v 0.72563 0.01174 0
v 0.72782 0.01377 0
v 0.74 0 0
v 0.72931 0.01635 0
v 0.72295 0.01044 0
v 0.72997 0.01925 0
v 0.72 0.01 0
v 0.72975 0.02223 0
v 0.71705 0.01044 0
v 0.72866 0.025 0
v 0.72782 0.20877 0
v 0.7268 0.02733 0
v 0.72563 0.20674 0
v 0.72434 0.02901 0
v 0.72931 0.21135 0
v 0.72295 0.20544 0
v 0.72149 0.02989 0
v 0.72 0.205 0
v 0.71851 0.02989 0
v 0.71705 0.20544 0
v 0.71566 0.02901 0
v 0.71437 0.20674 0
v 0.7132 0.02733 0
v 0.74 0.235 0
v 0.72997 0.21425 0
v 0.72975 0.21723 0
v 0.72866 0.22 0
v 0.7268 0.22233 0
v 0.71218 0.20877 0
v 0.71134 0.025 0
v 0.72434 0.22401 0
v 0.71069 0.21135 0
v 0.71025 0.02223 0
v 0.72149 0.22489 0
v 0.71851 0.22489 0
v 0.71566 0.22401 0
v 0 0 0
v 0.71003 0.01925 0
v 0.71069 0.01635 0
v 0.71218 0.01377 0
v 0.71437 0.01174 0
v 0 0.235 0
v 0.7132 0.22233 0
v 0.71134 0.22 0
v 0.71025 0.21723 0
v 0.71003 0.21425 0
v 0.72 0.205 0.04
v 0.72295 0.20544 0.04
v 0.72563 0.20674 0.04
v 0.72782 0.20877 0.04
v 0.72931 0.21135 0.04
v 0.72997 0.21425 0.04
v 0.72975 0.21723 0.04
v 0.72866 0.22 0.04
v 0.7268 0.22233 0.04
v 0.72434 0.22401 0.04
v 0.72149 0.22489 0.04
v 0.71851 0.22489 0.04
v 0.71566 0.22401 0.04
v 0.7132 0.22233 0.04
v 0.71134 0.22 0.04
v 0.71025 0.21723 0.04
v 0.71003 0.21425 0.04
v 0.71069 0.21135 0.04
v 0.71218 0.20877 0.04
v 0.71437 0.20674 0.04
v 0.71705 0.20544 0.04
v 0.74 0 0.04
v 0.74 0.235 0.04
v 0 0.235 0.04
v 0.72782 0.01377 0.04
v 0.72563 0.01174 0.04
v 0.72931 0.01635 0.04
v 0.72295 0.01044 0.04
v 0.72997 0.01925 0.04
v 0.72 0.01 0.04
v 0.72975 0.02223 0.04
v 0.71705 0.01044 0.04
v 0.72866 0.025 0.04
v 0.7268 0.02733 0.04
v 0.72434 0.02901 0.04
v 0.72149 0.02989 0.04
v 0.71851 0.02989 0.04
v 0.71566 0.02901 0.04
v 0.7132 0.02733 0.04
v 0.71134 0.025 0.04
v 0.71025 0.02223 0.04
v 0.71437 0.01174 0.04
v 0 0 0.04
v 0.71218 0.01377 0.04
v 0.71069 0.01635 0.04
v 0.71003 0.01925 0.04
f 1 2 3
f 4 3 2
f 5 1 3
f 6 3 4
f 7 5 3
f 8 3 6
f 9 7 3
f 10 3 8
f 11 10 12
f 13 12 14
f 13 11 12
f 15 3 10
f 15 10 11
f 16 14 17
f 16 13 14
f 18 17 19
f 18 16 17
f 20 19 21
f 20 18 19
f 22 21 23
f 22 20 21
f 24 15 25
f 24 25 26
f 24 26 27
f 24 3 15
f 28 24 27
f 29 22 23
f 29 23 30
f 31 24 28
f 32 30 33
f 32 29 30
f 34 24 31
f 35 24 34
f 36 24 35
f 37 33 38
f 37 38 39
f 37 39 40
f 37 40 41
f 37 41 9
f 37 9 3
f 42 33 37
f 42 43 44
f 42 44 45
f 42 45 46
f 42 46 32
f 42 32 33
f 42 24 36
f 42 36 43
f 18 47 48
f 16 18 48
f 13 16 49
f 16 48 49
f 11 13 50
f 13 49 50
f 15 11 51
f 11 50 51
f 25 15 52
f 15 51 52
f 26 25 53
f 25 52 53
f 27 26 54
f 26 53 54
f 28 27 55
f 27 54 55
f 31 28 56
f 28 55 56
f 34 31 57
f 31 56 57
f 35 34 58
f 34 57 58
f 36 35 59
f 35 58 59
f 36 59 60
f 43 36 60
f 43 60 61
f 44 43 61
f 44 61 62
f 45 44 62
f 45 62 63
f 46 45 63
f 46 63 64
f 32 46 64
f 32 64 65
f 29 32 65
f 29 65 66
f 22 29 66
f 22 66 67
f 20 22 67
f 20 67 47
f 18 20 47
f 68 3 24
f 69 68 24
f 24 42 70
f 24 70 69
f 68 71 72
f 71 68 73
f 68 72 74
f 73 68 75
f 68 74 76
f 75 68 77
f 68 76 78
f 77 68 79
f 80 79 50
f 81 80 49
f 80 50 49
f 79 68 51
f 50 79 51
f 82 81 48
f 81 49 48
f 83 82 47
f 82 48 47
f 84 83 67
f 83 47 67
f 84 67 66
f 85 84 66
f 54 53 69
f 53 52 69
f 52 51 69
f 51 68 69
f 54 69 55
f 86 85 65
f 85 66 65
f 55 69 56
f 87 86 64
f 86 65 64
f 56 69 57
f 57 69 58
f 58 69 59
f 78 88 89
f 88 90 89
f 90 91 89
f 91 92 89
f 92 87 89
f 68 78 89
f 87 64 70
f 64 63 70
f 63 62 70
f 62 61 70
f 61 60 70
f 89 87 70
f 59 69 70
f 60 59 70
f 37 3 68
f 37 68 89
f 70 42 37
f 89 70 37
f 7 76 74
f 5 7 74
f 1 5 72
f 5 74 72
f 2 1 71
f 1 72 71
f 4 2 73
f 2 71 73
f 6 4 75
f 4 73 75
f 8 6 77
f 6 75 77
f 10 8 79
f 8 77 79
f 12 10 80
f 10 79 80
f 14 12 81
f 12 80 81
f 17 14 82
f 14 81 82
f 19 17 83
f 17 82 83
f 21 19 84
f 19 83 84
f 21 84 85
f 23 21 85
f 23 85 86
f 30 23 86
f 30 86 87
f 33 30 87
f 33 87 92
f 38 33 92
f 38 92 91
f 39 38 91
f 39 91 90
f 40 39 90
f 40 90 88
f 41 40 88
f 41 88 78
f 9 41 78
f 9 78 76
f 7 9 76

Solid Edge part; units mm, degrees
sketch "Sketch1" plane through (0, 0, 0) normal (0, 0, 1) x (1, 0, 0)
  line L0 (0, 0.235) -> (0.74, 0.235)
  line L1 (0.74, 0) -> (0.74, 0.235)
  line L2 (0.74, 0) -> (0, 0)
  line L3 (0, 0.235) -> (0, 0)
  dimension "D1" = 0.04
extrude "Protrusion1" add sketch "Sketch1" along normal blind 0.04
hole "Bohrung_1" at (0.72, 0.02, 0.04) direction (0, 0, -1) diameter 0.02 end through all
hole "Hole1" at (0.72, 0.215, 0.04) direction (0, 0, -1) diameter 0.02 end through all
